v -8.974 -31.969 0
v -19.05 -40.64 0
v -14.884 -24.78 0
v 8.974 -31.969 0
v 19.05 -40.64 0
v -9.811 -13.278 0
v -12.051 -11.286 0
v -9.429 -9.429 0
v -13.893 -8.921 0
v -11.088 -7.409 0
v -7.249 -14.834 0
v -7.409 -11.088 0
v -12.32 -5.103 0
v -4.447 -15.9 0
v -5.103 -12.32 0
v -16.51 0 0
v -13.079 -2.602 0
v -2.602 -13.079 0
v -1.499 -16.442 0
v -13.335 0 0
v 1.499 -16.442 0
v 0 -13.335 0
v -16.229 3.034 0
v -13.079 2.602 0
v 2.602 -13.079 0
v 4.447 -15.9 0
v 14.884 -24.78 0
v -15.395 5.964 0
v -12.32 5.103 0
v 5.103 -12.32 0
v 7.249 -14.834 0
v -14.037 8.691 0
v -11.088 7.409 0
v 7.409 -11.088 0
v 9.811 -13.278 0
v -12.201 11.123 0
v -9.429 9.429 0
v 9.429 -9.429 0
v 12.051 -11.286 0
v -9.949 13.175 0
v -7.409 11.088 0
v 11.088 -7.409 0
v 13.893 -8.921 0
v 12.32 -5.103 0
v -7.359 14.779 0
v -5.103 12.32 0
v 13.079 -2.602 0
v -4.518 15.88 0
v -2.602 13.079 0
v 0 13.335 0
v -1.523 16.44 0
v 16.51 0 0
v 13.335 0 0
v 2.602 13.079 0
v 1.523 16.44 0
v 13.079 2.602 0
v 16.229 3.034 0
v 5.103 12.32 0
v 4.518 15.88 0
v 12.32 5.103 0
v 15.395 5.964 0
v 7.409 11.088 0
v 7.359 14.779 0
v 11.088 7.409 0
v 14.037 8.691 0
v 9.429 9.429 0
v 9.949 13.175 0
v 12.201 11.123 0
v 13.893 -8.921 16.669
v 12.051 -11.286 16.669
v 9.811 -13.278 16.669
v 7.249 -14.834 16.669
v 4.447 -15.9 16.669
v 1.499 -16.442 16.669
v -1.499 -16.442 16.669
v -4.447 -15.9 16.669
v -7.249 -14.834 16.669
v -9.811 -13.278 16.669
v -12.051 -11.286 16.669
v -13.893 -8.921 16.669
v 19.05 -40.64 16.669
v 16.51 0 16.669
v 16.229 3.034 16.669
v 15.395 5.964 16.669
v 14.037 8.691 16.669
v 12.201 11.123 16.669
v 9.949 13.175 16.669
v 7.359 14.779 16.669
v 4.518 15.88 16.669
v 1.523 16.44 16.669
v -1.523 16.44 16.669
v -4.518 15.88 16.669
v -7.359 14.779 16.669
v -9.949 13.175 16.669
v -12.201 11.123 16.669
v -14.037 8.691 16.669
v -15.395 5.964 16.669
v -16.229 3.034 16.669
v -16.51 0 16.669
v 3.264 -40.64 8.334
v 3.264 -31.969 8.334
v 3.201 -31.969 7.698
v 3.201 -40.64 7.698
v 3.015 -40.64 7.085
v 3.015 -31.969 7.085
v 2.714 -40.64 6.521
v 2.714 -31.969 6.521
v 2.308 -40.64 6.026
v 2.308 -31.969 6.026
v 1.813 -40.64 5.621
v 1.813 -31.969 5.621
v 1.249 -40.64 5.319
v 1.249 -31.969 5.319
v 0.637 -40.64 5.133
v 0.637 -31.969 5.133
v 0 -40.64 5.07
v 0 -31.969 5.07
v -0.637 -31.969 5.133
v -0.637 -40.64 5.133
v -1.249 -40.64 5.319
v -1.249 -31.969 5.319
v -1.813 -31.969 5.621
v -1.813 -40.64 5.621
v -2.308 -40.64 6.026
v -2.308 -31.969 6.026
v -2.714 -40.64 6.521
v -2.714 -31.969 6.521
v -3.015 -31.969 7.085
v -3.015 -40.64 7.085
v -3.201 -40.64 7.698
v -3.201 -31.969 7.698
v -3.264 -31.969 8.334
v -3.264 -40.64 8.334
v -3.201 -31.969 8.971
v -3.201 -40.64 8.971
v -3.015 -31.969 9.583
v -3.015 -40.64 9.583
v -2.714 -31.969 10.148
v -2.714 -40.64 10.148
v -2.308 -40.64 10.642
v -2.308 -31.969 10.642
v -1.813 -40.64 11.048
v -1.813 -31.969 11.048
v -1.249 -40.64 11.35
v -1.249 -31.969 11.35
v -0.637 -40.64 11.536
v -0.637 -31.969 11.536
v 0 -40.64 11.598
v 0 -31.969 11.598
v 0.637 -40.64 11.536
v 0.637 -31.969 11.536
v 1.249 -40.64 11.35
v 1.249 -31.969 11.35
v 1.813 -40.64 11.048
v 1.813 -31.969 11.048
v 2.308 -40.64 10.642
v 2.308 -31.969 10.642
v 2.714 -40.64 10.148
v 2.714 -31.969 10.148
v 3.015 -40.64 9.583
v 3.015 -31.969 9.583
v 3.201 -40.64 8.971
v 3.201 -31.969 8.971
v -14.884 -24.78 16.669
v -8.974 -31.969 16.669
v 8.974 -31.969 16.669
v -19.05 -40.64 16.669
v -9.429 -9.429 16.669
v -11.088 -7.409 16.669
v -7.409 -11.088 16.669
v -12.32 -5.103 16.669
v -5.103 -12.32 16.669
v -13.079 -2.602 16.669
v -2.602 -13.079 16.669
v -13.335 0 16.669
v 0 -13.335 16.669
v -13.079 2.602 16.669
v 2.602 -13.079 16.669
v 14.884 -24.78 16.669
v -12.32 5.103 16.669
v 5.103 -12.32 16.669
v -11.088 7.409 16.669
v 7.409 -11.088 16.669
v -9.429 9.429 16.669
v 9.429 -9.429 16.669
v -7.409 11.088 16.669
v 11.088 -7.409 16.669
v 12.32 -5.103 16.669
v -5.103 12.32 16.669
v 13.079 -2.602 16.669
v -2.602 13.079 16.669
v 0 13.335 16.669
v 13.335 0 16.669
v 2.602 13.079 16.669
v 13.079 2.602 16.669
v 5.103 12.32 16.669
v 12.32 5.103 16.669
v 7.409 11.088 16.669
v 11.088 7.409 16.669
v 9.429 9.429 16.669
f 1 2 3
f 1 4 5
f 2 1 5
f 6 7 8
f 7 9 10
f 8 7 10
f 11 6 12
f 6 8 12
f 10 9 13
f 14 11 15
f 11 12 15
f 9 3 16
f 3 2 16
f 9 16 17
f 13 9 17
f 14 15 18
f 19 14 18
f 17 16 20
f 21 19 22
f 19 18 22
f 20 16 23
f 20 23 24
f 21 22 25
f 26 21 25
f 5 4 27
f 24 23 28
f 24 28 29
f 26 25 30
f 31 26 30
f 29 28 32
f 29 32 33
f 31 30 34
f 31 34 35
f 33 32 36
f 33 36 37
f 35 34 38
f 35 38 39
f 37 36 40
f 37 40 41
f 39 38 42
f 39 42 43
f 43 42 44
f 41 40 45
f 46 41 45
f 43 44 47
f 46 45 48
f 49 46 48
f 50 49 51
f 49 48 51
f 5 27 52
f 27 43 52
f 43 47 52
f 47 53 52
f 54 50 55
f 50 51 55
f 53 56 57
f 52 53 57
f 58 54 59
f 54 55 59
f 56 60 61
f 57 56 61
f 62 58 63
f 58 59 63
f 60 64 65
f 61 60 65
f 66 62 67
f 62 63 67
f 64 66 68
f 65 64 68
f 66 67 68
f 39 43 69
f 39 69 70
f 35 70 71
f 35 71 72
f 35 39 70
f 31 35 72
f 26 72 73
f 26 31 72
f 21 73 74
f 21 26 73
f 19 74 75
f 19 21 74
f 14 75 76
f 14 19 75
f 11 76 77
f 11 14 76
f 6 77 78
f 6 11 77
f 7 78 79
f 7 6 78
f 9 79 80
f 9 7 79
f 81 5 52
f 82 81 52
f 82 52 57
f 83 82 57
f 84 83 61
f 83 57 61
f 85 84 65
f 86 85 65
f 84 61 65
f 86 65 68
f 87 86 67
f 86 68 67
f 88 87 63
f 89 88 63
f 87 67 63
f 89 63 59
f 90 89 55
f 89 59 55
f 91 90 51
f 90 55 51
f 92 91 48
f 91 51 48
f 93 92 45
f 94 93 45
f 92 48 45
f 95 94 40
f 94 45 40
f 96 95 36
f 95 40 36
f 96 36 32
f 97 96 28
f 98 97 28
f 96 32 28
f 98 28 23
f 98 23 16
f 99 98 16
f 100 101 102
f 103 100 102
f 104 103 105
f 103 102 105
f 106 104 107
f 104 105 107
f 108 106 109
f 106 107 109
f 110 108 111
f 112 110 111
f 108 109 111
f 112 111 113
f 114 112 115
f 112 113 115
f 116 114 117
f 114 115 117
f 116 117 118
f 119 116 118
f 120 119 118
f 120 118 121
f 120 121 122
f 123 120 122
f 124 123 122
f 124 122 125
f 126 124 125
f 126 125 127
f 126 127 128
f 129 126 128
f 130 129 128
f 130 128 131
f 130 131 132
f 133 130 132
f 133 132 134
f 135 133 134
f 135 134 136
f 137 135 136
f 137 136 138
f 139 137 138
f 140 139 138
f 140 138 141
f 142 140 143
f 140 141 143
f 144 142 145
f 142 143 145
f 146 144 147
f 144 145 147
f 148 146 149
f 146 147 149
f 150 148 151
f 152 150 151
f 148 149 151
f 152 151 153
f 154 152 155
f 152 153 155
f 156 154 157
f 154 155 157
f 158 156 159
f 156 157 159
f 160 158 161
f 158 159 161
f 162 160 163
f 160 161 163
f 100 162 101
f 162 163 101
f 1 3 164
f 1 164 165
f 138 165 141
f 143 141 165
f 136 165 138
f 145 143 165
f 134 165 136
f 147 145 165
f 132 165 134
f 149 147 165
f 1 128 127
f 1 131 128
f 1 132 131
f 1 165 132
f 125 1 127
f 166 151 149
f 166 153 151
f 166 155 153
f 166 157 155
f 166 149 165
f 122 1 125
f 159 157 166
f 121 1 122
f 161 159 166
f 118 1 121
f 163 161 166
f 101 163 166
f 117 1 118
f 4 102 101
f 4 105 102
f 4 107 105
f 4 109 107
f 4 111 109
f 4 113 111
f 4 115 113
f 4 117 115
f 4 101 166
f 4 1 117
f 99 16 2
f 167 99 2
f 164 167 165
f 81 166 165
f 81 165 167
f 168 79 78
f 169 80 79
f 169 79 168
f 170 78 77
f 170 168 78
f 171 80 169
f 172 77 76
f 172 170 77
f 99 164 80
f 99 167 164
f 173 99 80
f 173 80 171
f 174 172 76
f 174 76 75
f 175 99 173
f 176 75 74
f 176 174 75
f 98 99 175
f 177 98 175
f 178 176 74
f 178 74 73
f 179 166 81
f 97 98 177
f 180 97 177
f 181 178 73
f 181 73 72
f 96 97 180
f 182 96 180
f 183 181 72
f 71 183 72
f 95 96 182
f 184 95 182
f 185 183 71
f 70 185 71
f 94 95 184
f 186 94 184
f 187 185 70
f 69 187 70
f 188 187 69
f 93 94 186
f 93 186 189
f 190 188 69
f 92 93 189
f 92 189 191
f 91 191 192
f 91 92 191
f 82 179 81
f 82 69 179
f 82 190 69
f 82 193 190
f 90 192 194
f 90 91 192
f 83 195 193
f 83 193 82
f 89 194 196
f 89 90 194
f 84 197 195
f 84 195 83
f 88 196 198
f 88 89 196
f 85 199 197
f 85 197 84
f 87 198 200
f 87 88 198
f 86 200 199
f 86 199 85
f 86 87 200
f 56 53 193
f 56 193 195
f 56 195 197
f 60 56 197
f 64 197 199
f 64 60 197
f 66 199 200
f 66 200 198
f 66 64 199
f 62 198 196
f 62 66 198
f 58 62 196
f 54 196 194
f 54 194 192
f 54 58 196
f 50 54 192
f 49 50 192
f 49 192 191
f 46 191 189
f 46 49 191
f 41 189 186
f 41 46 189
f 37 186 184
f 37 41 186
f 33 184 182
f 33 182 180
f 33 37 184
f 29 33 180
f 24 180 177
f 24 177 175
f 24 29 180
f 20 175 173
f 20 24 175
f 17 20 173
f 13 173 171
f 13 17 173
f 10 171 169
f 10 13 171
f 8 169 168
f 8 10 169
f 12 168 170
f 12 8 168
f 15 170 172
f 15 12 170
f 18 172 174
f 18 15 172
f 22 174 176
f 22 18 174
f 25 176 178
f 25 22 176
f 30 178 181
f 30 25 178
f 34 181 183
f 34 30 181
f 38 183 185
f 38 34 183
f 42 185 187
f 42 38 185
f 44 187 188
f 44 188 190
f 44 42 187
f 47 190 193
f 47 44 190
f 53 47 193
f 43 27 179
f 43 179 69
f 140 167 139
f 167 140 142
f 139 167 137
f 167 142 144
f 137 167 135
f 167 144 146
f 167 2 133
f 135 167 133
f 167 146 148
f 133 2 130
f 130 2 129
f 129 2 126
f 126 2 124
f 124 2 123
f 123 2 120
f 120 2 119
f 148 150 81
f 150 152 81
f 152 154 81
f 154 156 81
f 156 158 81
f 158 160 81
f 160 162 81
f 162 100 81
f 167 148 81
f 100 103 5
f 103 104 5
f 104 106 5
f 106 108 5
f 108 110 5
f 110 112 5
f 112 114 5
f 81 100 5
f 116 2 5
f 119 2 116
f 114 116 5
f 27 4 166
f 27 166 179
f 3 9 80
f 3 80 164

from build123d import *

# Parameters (mm, degrees)
SKETCH1_R                   = 13.335
BOSS_EXTRUDE1_DEPTH         = 16.66875
F_1_4_CLEARANCE_HOLE1_D     = 6.5278
F_1_4_CLEARANCE_HOLE1_DEPTH = 8.671275816


with BuildPart() as part:
    # Sketch1 → Boss-Extrude1 (new body)
    with BuildSketch(Plane.XY):
        with BuildLine():
            Line((-19.05, -40.64), (19.05, -40.64))
            Line((19.05, -40.64), (16.51, 0))
            ThreePointArc((16.51, 0), (0, 16.51), (-16.51, 0))
            Line((-16.51, 0), (-19.05, -40.64))
        make_face()
        Circle(SKETCH1_R, mode=Mode.SUBTRACT)
        with BuildLine():
            Line((-13.892538769, -8.920620301), (-14.883769384, -24.780310151))
            Line((-14.883769384, -24.780310151), (-8.97384088, -31.968724184))
            Line((-8.97384088, -31.968724184), (8.97384088, -31.968724184))
            Line((8.97384088, -31.968724184), (14.883769384, -24.780310151))
            Line((14.883769384, -24.780310151), (13.892538769, -8.920620301))
            ThreePointArc((13.892538769, -8.920620301), (0, -16.51), (-13.892538769, -8.920620301))
        make_face(mode=Mode.SUBTRACT)
    extrude(amount=BOSS_EXTRUDE1_DEPTH)

    # 1/4 Clearance Hole1
    with Locations(Plane(origin=(0, -40.64, 0), x_dir=(-1, 0, 0), z_dir=(0, -1, 0))):
        with Locations((0, -8.334375)):
            Hole(F_1_4_CLEARANCE_HOLE1_D / 2, depth=F_1_4_CLEARANCE_HOLE1_DEPTH)


solid = part.part
